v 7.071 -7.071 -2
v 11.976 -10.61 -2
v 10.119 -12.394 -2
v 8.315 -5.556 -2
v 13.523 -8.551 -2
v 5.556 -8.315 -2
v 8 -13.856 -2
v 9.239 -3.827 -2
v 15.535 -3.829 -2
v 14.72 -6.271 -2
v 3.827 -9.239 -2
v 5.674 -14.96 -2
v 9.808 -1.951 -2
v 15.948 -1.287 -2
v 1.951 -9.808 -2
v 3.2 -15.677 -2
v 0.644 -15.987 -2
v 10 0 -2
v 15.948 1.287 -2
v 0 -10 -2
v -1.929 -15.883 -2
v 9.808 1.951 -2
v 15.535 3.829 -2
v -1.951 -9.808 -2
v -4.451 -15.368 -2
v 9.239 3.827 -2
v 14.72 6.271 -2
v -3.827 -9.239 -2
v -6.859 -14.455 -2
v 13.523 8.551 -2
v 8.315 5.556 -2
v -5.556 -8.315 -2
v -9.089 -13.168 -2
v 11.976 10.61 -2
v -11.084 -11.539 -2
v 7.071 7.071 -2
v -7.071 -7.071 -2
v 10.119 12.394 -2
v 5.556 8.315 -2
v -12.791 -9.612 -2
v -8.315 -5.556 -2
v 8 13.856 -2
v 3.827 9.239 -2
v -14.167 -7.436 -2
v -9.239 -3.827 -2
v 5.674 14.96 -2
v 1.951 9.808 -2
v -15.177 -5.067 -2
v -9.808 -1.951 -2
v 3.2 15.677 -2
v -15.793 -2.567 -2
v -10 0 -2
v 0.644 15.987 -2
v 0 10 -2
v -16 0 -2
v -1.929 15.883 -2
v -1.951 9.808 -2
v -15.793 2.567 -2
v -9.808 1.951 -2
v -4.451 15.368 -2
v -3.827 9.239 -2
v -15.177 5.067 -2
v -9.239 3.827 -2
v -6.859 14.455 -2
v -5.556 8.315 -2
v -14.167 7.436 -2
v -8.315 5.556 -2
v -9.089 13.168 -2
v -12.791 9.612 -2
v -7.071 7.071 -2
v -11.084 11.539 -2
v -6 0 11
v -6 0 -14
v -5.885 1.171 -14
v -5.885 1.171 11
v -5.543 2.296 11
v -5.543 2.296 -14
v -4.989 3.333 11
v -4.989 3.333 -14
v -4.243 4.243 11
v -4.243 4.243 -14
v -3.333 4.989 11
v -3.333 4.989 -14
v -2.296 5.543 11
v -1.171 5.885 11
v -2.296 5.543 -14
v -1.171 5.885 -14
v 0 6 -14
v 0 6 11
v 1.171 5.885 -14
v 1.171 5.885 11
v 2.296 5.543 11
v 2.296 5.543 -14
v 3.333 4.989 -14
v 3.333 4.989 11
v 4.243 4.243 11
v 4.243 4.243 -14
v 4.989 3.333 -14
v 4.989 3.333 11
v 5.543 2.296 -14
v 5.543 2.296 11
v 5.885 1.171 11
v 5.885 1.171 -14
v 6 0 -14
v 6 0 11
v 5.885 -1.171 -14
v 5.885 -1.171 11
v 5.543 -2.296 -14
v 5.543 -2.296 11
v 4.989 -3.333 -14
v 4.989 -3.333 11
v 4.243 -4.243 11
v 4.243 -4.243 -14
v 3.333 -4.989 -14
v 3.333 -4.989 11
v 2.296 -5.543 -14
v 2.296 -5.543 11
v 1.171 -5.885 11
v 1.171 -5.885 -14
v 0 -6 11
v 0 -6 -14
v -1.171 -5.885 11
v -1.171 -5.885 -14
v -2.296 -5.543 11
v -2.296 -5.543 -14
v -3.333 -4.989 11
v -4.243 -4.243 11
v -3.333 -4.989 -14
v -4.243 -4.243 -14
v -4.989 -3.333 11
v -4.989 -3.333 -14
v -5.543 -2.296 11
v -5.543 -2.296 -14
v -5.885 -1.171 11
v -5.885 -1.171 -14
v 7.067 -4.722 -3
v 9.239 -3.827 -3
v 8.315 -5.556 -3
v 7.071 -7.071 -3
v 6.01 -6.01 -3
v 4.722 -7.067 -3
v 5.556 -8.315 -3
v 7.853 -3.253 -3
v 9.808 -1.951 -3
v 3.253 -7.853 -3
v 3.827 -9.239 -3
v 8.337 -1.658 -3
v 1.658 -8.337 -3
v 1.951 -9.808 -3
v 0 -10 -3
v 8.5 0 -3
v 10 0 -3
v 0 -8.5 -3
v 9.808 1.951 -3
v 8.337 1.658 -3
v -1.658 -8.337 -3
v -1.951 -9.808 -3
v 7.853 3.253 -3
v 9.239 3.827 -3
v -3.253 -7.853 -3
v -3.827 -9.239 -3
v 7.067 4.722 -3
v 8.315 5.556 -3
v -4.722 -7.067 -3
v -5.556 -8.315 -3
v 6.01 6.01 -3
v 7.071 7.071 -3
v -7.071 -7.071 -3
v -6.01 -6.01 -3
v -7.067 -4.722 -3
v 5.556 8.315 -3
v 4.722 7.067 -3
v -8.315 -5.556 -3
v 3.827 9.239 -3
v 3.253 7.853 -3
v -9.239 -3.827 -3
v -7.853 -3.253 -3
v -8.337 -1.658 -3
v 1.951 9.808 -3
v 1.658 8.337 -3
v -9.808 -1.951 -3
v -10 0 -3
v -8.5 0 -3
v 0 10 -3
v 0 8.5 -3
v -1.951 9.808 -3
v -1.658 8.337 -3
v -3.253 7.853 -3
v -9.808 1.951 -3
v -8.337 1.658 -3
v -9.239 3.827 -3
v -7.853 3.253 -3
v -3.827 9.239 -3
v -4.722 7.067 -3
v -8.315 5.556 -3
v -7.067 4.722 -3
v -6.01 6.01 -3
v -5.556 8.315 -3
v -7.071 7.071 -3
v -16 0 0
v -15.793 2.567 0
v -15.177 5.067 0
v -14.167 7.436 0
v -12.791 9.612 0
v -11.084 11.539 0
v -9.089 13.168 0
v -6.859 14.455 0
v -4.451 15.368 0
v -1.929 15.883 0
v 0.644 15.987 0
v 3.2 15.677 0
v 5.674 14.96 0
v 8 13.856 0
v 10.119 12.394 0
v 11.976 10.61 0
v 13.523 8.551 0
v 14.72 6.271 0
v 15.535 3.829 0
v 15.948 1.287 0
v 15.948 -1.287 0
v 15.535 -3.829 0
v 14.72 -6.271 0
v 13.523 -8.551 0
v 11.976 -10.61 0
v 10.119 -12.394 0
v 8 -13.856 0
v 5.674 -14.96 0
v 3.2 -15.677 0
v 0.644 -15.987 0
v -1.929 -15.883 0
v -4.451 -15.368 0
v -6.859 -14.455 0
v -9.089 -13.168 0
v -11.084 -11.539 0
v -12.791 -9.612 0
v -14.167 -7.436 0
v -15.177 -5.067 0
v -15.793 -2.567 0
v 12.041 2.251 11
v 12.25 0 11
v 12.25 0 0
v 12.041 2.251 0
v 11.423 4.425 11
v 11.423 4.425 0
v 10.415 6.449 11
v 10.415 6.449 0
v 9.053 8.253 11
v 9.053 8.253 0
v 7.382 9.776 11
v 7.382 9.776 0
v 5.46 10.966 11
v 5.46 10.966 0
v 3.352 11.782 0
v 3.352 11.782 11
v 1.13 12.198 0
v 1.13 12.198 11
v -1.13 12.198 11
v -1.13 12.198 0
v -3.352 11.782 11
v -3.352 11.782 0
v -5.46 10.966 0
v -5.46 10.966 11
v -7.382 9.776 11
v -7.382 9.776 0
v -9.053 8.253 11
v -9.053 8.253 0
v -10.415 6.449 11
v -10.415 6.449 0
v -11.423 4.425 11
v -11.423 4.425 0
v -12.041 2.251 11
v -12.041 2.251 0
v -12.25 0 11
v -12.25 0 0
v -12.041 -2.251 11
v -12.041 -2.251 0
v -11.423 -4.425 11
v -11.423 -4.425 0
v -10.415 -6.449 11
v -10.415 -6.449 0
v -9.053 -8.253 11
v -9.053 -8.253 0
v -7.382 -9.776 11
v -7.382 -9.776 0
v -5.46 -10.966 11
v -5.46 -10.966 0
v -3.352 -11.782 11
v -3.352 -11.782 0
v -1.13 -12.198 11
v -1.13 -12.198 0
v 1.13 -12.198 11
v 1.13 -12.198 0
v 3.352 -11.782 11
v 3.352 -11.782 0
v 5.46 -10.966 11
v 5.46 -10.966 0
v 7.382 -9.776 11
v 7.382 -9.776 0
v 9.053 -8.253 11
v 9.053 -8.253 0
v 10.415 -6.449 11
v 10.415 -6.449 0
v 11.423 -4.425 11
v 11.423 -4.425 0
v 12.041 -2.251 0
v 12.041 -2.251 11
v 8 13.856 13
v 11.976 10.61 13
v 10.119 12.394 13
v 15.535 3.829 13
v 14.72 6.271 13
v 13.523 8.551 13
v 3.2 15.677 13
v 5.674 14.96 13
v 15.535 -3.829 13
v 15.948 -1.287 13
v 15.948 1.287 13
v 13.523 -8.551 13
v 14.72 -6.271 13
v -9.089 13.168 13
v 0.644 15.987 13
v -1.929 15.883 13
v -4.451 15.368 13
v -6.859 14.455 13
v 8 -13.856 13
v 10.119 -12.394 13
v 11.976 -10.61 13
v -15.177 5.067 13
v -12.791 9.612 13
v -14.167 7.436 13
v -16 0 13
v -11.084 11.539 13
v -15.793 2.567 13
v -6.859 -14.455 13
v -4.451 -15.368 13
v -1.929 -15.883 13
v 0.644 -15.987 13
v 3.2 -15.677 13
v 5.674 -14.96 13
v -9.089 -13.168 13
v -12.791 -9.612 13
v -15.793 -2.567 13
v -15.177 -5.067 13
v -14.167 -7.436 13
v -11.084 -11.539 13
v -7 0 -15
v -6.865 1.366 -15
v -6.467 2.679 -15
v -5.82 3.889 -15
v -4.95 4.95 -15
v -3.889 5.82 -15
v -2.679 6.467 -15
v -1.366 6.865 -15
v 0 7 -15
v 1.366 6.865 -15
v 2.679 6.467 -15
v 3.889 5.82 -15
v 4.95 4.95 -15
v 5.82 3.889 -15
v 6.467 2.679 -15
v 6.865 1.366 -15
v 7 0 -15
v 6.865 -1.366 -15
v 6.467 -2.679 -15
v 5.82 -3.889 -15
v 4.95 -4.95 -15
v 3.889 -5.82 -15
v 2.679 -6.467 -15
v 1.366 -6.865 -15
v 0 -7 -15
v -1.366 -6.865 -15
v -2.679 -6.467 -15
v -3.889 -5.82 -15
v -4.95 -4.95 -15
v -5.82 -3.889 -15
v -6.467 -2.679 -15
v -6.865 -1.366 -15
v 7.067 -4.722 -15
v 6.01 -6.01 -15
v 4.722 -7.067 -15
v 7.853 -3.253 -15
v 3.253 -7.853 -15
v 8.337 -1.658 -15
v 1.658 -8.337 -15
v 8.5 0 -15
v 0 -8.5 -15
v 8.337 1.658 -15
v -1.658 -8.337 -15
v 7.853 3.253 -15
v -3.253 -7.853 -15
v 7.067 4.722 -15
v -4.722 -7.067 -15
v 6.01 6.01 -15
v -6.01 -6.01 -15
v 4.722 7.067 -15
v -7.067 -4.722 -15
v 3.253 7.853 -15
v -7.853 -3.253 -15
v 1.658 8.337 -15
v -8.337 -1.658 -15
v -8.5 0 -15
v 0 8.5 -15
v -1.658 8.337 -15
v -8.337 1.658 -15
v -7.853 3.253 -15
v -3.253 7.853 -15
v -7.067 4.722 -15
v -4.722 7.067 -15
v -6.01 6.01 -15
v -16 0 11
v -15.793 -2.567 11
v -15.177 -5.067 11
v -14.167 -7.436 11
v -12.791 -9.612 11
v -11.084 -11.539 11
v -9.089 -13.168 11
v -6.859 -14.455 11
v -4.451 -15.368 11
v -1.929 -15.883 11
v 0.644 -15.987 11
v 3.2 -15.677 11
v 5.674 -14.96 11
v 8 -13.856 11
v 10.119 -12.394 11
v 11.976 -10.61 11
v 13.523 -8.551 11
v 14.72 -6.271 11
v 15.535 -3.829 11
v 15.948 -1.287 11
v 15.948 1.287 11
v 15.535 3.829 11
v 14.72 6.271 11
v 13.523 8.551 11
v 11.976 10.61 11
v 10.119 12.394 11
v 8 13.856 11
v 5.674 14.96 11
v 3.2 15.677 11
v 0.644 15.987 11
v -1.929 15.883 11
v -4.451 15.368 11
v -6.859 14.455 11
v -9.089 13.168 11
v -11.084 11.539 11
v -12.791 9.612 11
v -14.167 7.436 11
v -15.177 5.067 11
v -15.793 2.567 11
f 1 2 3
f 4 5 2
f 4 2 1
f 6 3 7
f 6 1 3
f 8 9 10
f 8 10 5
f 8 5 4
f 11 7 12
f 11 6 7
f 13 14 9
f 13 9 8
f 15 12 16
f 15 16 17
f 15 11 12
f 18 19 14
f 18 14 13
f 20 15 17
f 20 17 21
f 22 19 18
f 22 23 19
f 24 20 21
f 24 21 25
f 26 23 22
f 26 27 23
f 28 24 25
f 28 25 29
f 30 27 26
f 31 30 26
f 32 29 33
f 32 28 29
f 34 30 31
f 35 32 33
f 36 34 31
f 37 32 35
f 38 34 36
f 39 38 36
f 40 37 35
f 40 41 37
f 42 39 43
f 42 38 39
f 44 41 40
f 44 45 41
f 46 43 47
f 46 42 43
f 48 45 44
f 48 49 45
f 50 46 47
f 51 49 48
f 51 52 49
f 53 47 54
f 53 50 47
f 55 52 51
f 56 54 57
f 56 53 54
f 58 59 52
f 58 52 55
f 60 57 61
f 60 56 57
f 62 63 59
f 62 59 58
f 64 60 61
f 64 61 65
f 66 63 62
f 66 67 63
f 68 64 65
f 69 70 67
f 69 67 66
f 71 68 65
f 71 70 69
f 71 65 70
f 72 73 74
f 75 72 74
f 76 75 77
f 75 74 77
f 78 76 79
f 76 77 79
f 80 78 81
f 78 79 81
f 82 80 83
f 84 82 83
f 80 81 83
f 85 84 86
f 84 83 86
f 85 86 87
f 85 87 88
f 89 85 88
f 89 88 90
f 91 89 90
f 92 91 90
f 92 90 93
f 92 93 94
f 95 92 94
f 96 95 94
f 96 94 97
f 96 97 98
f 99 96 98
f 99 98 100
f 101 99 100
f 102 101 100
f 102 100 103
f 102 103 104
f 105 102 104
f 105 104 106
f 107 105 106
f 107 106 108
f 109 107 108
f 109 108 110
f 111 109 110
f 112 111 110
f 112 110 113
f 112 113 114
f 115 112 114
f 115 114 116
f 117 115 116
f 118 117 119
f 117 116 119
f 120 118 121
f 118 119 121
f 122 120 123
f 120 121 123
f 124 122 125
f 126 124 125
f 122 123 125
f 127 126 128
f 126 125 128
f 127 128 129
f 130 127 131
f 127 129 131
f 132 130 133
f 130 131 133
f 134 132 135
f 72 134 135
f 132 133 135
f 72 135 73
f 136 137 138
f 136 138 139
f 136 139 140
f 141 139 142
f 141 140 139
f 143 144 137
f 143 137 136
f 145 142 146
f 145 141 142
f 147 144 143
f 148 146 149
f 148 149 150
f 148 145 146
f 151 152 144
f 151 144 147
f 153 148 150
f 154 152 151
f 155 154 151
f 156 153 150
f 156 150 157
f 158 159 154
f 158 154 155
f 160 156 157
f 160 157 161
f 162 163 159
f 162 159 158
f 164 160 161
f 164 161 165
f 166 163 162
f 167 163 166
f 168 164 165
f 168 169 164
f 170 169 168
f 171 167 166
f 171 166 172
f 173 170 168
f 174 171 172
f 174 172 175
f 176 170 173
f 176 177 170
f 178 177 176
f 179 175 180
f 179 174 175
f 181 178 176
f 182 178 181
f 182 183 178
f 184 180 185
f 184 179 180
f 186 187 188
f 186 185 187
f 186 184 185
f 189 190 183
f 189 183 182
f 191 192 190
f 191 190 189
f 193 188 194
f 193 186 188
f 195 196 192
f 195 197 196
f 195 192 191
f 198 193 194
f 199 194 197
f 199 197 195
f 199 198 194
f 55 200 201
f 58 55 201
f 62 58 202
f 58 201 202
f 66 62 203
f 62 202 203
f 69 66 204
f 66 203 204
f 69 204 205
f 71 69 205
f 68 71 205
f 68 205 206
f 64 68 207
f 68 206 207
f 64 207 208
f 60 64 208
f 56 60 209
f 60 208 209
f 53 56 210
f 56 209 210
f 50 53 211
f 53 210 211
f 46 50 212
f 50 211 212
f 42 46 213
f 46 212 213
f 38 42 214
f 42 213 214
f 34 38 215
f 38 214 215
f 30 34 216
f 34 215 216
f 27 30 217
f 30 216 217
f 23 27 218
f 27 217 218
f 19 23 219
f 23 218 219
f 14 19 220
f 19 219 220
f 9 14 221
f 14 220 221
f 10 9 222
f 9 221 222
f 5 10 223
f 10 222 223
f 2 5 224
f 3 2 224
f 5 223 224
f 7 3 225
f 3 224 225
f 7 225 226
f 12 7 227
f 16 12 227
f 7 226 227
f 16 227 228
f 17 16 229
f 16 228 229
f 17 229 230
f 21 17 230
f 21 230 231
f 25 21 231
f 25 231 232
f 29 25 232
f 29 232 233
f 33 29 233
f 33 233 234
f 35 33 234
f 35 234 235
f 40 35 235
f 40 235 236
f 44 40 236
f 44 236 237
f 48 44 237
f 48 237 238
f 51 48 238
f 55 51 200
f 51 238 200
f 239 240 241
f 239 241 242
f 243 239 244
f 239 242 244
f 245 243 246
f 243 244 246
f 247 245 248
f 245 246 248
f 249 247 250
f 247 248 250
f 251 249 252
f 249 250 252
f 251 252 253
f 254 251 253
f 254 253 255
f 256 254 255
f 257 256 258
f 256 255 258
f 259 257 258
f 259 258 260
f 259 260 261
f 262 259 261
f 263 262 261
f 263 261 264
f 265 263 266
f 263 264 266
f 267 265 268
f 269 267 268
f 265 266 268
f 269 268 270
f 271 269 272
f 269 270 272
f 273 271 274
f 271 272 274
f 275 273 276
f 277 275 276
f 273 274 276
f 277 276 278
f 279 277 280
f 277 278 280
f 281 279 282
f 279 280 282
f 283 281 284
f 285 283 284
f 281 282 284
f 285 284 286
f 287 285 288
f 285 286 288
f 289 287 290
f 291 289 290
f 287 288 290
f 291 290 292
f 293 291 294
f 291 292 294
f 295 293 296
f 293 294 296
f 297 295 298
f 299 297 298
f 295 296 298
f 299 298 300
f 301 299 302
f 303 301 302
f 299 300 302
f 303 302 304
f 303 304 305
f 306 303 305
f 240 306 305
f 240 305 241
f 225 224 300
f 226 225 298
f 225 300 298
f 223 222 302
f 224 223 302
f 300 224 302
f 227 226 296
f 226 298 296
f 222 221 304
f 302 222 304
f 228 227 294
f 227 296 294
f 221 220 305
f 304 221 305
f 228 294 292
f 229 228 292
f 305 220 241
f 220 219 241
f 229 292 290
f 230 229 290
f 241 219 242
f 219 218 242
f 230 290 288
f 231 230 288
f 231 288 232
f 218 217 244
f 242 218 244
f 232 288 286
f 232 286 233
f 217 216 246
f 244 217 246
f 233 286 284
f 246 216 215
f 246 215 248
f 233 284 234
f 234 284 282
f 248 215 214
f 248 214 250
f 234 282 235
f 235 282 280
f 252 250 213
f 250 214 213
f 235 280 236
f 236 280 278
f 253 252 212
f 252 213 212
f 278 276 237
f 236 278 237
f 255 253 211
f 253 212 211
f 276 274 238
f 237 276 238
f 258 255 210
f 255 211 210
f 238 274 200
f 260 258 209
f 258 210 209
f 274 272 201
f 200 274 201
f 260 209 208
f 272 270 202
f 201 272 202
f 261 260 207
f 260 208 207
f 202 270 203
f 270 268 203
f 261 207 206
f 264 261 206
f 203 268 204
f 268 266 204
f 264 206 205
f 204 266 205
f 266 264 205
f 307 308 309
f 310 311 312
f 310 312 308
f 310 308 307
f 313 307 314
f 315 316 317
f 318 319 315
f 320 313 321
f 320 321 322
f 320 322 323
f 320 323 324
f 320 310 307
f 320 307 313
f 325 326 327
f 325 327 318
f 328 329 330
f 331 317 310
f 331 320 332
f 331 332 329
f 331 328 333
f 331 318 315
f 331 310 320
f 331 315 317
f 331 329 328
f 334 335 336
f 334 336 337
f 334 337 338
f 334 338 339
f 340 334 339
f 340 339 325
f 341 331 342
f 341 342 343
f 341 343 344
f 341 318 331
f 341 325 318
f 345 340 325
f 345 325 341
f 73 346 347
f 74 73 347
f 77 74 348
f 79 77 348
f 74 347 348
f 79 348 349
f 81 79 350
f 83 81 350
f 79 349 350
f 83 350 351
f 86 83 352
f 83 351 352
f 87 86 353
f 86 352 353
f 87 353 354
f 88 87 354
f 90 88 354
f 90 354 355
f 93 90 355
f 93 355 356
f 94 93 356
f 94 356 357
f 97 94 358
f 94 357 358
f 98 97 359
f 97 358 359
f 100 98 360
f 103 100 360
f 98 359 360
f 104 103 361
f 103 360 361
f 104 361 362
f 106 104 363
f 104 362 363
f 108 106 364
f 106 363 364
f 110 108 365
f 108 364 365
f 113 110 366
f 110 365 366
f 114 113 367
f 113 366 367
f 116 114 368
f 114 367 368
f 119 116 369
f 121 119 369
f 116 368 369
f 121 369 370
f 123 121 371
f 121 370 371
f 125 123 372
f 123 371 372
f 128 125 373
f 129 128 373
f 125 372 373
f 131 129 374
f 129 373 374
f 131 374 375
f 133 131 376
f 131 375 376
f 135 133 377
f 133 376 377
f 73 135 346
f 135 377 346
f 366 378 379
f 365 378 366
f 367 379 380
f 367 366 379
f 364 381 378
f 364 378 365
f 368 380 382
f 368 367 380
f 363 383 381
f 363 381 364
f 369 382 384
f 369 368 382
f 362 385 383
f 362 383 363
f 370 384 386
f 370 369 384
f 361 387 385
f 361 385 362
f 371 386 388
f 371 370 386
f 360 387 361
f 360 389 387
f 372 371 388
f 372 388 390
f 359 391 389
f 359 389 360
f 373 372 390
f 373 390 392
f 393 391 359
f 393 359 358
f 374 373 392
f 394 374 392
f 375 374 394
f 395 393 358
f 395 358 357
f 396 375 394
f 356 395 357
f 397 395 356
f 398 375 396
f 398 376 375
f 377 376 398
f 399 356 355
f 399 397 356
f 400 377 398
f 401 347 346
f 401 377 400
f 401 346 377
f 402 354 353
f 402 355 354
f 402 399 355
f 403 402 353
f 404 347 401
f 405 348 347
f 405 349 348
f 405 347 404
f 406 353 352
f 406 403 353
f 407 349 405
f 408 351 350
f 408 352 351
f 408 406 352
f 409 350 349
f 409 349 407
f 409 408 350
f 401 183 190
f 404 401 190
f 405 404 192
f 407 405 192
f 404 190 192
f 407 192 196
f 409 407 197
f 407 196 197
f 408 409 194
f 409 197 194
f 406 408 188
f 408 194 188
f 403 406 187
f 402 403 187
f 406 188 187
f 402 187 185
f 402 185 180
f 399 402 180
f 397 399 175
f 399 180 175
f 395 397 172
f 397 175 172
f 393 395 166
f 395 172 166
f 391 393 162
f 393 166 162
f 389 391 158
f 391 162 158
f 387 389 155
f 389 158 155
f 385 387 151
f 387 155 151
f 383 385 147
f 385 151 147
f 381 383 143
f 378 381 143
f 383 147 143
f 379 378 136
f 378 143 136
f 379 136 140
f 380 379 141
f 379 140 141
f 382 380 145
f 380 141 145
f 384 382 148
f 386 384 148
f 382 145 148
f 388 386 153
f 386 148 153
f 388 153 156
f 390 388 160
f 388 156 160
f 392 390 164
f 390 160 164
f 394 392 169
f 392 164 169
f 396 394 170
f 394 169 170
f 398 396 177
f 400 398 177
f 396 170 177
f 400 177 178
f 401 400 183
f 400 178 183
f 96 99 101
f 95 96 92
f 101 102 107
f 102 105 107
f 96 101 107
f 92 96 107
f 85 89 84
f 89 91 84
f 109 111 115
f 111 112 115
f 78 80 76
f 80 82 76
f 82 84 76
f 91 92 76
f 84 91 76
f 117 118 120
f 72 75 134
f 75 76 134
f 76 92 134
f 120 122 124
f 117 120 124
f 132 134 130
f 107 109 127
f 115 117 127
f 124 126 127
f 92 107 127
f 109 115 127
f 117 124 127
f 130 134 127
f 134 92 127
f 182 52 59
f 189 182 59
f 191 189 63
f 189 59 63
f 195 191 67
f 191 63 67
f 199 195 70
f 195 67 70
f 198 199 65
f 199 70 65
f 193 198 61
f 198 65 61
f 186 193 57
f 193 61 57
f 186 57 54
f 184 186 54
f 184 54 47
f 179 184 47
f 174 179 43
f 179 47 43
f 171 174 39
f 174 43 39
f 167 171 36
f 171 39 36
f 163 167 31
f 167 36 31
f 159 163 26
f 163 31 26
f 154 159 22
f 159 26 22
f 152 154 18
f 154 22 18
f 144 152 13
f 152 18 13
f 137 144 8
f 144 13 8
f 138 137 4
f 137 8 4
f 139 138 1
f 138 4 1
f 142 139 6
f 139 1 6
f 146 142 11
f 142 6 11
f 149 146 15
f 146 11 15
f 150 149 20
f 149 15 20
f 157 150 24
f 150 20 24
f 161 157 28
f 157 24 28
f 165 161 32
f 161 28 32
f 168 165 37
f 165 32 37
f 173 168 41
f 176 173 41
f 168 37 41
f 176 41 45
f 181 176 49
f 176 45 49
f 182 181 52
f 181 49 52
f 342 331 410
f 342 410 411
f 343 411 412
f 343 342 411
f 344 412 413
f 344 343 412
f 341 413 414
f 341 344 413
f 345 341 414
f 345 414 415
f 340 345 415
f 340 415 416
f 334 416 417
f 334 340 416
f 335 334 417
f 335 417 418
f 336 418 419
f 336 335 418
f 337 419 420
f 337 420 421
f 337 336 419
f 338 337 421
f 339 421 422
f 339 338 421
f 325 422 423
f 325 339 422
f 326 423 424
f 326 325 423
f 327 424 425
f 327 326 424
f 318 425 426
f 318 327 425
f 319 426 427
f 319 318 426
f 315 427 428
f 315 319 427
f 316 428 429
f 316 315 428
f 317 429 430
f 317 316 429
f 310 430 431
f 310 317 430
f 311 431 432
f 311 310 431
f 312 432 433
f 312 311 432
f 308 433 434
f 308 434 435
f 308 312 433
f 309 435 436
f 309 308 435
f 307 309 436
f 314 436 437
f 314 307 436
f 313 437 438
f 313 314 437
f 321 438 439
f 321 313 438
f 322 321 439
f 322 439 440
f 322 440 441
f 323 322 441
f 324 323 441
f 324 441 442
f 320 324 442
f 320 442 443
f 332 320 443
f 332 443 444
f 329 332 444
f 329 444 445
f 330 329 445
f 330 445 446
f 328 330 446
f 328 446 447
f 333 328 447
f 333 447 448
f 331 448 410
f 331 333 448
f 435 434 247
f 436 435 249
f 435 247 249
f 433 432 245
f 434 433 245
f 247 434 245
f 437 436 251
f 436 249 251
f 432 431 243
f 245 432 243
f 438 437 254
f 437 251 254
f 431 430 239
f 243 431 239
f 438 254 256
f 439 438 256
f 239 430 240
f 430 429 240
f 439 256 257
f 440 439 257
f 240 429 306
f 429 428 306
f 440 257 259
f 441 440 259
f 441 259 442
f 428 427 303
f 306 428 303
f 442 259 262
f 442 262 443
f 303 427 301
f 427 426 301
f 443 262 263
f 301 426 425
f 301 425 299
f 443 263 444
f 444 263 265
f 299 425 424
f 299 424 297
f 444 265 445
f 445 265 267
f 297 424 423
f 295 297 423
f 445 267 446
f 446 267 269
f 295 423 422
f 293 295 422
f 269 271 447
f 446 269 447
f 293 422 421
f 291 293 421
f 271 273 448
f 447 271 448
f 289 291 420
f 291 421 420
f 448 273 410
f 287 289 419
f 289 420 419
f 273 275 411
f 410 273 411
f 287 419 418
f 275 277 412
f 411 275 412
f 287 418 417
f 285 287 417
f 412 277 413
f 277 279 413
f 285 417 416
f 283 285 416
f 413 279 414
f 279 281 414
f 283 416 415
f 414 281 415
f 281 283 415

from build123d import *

# Parameters (mm, degrees)
SKETCH1_R           = 12.25
BOSS_EXTRUDE1_DEPTH = 11
SKETCH2_R           = 16
BOSS_EXTRUDE2_DEPTH = 2
SKETCH4_R           = 10
BOSS_EXTRUDE4_DEPTH = 1
SKETCH5_R           = 8.5
BOSS_EXTRUDE5_DEPTH = 12
SKETCH6_R           = 6
CUT_EXTRUDE1_DEPTH  = 35.467375879
CHAMFER1_SIZE       = 1
BOSS_EXTRUDE6_START = 2
SKETCH3_R           = 16
BOSS_EXTRUDE6_DEPTH = 2


with BuildPart() as part:
    # Sketch1 → Boss-Extrude1 (new body)
    with BuildSketch(Plane.XY):
        Circle(SKETCH1_R)
    extrude(amount=BOSS_EXTRUDE1_DEPTH)

    # Sketch2 → Boss-Extrude2 (add)
    with BuildSketch(Plane(origin=(0, 0, 0), x_dir=(-1, 0, 0), z_dir=(0, 0, -1))):
        Circle(SKETCH2_R)
    extrude(amount=BOSS_EXTRUDE2_DEPTH)

    # Sketch4 → Boss-Extrude4 (add)
    with BuildSketch(Plane(origin=(0, 0, -2), x_dir=(-1, 0, 0), z_dir=(0, 0, -1))):
        Circle(SKETCH4_R)
    extrude(amount=BOSS_EXTRUDE4_DEPTH)

    # Sketch5 → Boss-Extrude5 (add)
    with BuildSketch(Plane(origin=(0, 0, -3), x_dir=(-1, 0, 0), z_dir=(0, 0, -1))):
        Circle(SKETCH5_R)
    extrude(amount=BOSS_EXTRUDE5_DEPTH)

    # Sketch6 → Cut-Extrude1 (cut, through all)
    with BuildSketch(Plane(origin=(0, 0, -15), x_dir=(-1, 0, 0), z_dir=(0, 0, -1))):
        Circle(SKETCH6_R)
    extrude(amount=-CUT_EXTRUDE1_DEPTH, mode=Mode.SUBTRACT)

    # Chamfer1
    chamfer1_edges = [part.edges().sort_by_distance(p)[0] for p in [
        (6, 0, -15),
    ]]
    chamfer(chamfer1_edges, length=CHAMFER1_SIZE)

    # Sketch3 → Boss-Extrude6 (add)
    with BuildSketch(Plane.XY.offset(11).offset(BOSS_EXTRUDE6_START)):
        with Locations(Location((0, 0, 0), (0, 0, 180))):
            Circle(SKETCH3_R)
    extrude(amount=-BOSS_EXTRUDE6_DEPTH)


solid = part.part
